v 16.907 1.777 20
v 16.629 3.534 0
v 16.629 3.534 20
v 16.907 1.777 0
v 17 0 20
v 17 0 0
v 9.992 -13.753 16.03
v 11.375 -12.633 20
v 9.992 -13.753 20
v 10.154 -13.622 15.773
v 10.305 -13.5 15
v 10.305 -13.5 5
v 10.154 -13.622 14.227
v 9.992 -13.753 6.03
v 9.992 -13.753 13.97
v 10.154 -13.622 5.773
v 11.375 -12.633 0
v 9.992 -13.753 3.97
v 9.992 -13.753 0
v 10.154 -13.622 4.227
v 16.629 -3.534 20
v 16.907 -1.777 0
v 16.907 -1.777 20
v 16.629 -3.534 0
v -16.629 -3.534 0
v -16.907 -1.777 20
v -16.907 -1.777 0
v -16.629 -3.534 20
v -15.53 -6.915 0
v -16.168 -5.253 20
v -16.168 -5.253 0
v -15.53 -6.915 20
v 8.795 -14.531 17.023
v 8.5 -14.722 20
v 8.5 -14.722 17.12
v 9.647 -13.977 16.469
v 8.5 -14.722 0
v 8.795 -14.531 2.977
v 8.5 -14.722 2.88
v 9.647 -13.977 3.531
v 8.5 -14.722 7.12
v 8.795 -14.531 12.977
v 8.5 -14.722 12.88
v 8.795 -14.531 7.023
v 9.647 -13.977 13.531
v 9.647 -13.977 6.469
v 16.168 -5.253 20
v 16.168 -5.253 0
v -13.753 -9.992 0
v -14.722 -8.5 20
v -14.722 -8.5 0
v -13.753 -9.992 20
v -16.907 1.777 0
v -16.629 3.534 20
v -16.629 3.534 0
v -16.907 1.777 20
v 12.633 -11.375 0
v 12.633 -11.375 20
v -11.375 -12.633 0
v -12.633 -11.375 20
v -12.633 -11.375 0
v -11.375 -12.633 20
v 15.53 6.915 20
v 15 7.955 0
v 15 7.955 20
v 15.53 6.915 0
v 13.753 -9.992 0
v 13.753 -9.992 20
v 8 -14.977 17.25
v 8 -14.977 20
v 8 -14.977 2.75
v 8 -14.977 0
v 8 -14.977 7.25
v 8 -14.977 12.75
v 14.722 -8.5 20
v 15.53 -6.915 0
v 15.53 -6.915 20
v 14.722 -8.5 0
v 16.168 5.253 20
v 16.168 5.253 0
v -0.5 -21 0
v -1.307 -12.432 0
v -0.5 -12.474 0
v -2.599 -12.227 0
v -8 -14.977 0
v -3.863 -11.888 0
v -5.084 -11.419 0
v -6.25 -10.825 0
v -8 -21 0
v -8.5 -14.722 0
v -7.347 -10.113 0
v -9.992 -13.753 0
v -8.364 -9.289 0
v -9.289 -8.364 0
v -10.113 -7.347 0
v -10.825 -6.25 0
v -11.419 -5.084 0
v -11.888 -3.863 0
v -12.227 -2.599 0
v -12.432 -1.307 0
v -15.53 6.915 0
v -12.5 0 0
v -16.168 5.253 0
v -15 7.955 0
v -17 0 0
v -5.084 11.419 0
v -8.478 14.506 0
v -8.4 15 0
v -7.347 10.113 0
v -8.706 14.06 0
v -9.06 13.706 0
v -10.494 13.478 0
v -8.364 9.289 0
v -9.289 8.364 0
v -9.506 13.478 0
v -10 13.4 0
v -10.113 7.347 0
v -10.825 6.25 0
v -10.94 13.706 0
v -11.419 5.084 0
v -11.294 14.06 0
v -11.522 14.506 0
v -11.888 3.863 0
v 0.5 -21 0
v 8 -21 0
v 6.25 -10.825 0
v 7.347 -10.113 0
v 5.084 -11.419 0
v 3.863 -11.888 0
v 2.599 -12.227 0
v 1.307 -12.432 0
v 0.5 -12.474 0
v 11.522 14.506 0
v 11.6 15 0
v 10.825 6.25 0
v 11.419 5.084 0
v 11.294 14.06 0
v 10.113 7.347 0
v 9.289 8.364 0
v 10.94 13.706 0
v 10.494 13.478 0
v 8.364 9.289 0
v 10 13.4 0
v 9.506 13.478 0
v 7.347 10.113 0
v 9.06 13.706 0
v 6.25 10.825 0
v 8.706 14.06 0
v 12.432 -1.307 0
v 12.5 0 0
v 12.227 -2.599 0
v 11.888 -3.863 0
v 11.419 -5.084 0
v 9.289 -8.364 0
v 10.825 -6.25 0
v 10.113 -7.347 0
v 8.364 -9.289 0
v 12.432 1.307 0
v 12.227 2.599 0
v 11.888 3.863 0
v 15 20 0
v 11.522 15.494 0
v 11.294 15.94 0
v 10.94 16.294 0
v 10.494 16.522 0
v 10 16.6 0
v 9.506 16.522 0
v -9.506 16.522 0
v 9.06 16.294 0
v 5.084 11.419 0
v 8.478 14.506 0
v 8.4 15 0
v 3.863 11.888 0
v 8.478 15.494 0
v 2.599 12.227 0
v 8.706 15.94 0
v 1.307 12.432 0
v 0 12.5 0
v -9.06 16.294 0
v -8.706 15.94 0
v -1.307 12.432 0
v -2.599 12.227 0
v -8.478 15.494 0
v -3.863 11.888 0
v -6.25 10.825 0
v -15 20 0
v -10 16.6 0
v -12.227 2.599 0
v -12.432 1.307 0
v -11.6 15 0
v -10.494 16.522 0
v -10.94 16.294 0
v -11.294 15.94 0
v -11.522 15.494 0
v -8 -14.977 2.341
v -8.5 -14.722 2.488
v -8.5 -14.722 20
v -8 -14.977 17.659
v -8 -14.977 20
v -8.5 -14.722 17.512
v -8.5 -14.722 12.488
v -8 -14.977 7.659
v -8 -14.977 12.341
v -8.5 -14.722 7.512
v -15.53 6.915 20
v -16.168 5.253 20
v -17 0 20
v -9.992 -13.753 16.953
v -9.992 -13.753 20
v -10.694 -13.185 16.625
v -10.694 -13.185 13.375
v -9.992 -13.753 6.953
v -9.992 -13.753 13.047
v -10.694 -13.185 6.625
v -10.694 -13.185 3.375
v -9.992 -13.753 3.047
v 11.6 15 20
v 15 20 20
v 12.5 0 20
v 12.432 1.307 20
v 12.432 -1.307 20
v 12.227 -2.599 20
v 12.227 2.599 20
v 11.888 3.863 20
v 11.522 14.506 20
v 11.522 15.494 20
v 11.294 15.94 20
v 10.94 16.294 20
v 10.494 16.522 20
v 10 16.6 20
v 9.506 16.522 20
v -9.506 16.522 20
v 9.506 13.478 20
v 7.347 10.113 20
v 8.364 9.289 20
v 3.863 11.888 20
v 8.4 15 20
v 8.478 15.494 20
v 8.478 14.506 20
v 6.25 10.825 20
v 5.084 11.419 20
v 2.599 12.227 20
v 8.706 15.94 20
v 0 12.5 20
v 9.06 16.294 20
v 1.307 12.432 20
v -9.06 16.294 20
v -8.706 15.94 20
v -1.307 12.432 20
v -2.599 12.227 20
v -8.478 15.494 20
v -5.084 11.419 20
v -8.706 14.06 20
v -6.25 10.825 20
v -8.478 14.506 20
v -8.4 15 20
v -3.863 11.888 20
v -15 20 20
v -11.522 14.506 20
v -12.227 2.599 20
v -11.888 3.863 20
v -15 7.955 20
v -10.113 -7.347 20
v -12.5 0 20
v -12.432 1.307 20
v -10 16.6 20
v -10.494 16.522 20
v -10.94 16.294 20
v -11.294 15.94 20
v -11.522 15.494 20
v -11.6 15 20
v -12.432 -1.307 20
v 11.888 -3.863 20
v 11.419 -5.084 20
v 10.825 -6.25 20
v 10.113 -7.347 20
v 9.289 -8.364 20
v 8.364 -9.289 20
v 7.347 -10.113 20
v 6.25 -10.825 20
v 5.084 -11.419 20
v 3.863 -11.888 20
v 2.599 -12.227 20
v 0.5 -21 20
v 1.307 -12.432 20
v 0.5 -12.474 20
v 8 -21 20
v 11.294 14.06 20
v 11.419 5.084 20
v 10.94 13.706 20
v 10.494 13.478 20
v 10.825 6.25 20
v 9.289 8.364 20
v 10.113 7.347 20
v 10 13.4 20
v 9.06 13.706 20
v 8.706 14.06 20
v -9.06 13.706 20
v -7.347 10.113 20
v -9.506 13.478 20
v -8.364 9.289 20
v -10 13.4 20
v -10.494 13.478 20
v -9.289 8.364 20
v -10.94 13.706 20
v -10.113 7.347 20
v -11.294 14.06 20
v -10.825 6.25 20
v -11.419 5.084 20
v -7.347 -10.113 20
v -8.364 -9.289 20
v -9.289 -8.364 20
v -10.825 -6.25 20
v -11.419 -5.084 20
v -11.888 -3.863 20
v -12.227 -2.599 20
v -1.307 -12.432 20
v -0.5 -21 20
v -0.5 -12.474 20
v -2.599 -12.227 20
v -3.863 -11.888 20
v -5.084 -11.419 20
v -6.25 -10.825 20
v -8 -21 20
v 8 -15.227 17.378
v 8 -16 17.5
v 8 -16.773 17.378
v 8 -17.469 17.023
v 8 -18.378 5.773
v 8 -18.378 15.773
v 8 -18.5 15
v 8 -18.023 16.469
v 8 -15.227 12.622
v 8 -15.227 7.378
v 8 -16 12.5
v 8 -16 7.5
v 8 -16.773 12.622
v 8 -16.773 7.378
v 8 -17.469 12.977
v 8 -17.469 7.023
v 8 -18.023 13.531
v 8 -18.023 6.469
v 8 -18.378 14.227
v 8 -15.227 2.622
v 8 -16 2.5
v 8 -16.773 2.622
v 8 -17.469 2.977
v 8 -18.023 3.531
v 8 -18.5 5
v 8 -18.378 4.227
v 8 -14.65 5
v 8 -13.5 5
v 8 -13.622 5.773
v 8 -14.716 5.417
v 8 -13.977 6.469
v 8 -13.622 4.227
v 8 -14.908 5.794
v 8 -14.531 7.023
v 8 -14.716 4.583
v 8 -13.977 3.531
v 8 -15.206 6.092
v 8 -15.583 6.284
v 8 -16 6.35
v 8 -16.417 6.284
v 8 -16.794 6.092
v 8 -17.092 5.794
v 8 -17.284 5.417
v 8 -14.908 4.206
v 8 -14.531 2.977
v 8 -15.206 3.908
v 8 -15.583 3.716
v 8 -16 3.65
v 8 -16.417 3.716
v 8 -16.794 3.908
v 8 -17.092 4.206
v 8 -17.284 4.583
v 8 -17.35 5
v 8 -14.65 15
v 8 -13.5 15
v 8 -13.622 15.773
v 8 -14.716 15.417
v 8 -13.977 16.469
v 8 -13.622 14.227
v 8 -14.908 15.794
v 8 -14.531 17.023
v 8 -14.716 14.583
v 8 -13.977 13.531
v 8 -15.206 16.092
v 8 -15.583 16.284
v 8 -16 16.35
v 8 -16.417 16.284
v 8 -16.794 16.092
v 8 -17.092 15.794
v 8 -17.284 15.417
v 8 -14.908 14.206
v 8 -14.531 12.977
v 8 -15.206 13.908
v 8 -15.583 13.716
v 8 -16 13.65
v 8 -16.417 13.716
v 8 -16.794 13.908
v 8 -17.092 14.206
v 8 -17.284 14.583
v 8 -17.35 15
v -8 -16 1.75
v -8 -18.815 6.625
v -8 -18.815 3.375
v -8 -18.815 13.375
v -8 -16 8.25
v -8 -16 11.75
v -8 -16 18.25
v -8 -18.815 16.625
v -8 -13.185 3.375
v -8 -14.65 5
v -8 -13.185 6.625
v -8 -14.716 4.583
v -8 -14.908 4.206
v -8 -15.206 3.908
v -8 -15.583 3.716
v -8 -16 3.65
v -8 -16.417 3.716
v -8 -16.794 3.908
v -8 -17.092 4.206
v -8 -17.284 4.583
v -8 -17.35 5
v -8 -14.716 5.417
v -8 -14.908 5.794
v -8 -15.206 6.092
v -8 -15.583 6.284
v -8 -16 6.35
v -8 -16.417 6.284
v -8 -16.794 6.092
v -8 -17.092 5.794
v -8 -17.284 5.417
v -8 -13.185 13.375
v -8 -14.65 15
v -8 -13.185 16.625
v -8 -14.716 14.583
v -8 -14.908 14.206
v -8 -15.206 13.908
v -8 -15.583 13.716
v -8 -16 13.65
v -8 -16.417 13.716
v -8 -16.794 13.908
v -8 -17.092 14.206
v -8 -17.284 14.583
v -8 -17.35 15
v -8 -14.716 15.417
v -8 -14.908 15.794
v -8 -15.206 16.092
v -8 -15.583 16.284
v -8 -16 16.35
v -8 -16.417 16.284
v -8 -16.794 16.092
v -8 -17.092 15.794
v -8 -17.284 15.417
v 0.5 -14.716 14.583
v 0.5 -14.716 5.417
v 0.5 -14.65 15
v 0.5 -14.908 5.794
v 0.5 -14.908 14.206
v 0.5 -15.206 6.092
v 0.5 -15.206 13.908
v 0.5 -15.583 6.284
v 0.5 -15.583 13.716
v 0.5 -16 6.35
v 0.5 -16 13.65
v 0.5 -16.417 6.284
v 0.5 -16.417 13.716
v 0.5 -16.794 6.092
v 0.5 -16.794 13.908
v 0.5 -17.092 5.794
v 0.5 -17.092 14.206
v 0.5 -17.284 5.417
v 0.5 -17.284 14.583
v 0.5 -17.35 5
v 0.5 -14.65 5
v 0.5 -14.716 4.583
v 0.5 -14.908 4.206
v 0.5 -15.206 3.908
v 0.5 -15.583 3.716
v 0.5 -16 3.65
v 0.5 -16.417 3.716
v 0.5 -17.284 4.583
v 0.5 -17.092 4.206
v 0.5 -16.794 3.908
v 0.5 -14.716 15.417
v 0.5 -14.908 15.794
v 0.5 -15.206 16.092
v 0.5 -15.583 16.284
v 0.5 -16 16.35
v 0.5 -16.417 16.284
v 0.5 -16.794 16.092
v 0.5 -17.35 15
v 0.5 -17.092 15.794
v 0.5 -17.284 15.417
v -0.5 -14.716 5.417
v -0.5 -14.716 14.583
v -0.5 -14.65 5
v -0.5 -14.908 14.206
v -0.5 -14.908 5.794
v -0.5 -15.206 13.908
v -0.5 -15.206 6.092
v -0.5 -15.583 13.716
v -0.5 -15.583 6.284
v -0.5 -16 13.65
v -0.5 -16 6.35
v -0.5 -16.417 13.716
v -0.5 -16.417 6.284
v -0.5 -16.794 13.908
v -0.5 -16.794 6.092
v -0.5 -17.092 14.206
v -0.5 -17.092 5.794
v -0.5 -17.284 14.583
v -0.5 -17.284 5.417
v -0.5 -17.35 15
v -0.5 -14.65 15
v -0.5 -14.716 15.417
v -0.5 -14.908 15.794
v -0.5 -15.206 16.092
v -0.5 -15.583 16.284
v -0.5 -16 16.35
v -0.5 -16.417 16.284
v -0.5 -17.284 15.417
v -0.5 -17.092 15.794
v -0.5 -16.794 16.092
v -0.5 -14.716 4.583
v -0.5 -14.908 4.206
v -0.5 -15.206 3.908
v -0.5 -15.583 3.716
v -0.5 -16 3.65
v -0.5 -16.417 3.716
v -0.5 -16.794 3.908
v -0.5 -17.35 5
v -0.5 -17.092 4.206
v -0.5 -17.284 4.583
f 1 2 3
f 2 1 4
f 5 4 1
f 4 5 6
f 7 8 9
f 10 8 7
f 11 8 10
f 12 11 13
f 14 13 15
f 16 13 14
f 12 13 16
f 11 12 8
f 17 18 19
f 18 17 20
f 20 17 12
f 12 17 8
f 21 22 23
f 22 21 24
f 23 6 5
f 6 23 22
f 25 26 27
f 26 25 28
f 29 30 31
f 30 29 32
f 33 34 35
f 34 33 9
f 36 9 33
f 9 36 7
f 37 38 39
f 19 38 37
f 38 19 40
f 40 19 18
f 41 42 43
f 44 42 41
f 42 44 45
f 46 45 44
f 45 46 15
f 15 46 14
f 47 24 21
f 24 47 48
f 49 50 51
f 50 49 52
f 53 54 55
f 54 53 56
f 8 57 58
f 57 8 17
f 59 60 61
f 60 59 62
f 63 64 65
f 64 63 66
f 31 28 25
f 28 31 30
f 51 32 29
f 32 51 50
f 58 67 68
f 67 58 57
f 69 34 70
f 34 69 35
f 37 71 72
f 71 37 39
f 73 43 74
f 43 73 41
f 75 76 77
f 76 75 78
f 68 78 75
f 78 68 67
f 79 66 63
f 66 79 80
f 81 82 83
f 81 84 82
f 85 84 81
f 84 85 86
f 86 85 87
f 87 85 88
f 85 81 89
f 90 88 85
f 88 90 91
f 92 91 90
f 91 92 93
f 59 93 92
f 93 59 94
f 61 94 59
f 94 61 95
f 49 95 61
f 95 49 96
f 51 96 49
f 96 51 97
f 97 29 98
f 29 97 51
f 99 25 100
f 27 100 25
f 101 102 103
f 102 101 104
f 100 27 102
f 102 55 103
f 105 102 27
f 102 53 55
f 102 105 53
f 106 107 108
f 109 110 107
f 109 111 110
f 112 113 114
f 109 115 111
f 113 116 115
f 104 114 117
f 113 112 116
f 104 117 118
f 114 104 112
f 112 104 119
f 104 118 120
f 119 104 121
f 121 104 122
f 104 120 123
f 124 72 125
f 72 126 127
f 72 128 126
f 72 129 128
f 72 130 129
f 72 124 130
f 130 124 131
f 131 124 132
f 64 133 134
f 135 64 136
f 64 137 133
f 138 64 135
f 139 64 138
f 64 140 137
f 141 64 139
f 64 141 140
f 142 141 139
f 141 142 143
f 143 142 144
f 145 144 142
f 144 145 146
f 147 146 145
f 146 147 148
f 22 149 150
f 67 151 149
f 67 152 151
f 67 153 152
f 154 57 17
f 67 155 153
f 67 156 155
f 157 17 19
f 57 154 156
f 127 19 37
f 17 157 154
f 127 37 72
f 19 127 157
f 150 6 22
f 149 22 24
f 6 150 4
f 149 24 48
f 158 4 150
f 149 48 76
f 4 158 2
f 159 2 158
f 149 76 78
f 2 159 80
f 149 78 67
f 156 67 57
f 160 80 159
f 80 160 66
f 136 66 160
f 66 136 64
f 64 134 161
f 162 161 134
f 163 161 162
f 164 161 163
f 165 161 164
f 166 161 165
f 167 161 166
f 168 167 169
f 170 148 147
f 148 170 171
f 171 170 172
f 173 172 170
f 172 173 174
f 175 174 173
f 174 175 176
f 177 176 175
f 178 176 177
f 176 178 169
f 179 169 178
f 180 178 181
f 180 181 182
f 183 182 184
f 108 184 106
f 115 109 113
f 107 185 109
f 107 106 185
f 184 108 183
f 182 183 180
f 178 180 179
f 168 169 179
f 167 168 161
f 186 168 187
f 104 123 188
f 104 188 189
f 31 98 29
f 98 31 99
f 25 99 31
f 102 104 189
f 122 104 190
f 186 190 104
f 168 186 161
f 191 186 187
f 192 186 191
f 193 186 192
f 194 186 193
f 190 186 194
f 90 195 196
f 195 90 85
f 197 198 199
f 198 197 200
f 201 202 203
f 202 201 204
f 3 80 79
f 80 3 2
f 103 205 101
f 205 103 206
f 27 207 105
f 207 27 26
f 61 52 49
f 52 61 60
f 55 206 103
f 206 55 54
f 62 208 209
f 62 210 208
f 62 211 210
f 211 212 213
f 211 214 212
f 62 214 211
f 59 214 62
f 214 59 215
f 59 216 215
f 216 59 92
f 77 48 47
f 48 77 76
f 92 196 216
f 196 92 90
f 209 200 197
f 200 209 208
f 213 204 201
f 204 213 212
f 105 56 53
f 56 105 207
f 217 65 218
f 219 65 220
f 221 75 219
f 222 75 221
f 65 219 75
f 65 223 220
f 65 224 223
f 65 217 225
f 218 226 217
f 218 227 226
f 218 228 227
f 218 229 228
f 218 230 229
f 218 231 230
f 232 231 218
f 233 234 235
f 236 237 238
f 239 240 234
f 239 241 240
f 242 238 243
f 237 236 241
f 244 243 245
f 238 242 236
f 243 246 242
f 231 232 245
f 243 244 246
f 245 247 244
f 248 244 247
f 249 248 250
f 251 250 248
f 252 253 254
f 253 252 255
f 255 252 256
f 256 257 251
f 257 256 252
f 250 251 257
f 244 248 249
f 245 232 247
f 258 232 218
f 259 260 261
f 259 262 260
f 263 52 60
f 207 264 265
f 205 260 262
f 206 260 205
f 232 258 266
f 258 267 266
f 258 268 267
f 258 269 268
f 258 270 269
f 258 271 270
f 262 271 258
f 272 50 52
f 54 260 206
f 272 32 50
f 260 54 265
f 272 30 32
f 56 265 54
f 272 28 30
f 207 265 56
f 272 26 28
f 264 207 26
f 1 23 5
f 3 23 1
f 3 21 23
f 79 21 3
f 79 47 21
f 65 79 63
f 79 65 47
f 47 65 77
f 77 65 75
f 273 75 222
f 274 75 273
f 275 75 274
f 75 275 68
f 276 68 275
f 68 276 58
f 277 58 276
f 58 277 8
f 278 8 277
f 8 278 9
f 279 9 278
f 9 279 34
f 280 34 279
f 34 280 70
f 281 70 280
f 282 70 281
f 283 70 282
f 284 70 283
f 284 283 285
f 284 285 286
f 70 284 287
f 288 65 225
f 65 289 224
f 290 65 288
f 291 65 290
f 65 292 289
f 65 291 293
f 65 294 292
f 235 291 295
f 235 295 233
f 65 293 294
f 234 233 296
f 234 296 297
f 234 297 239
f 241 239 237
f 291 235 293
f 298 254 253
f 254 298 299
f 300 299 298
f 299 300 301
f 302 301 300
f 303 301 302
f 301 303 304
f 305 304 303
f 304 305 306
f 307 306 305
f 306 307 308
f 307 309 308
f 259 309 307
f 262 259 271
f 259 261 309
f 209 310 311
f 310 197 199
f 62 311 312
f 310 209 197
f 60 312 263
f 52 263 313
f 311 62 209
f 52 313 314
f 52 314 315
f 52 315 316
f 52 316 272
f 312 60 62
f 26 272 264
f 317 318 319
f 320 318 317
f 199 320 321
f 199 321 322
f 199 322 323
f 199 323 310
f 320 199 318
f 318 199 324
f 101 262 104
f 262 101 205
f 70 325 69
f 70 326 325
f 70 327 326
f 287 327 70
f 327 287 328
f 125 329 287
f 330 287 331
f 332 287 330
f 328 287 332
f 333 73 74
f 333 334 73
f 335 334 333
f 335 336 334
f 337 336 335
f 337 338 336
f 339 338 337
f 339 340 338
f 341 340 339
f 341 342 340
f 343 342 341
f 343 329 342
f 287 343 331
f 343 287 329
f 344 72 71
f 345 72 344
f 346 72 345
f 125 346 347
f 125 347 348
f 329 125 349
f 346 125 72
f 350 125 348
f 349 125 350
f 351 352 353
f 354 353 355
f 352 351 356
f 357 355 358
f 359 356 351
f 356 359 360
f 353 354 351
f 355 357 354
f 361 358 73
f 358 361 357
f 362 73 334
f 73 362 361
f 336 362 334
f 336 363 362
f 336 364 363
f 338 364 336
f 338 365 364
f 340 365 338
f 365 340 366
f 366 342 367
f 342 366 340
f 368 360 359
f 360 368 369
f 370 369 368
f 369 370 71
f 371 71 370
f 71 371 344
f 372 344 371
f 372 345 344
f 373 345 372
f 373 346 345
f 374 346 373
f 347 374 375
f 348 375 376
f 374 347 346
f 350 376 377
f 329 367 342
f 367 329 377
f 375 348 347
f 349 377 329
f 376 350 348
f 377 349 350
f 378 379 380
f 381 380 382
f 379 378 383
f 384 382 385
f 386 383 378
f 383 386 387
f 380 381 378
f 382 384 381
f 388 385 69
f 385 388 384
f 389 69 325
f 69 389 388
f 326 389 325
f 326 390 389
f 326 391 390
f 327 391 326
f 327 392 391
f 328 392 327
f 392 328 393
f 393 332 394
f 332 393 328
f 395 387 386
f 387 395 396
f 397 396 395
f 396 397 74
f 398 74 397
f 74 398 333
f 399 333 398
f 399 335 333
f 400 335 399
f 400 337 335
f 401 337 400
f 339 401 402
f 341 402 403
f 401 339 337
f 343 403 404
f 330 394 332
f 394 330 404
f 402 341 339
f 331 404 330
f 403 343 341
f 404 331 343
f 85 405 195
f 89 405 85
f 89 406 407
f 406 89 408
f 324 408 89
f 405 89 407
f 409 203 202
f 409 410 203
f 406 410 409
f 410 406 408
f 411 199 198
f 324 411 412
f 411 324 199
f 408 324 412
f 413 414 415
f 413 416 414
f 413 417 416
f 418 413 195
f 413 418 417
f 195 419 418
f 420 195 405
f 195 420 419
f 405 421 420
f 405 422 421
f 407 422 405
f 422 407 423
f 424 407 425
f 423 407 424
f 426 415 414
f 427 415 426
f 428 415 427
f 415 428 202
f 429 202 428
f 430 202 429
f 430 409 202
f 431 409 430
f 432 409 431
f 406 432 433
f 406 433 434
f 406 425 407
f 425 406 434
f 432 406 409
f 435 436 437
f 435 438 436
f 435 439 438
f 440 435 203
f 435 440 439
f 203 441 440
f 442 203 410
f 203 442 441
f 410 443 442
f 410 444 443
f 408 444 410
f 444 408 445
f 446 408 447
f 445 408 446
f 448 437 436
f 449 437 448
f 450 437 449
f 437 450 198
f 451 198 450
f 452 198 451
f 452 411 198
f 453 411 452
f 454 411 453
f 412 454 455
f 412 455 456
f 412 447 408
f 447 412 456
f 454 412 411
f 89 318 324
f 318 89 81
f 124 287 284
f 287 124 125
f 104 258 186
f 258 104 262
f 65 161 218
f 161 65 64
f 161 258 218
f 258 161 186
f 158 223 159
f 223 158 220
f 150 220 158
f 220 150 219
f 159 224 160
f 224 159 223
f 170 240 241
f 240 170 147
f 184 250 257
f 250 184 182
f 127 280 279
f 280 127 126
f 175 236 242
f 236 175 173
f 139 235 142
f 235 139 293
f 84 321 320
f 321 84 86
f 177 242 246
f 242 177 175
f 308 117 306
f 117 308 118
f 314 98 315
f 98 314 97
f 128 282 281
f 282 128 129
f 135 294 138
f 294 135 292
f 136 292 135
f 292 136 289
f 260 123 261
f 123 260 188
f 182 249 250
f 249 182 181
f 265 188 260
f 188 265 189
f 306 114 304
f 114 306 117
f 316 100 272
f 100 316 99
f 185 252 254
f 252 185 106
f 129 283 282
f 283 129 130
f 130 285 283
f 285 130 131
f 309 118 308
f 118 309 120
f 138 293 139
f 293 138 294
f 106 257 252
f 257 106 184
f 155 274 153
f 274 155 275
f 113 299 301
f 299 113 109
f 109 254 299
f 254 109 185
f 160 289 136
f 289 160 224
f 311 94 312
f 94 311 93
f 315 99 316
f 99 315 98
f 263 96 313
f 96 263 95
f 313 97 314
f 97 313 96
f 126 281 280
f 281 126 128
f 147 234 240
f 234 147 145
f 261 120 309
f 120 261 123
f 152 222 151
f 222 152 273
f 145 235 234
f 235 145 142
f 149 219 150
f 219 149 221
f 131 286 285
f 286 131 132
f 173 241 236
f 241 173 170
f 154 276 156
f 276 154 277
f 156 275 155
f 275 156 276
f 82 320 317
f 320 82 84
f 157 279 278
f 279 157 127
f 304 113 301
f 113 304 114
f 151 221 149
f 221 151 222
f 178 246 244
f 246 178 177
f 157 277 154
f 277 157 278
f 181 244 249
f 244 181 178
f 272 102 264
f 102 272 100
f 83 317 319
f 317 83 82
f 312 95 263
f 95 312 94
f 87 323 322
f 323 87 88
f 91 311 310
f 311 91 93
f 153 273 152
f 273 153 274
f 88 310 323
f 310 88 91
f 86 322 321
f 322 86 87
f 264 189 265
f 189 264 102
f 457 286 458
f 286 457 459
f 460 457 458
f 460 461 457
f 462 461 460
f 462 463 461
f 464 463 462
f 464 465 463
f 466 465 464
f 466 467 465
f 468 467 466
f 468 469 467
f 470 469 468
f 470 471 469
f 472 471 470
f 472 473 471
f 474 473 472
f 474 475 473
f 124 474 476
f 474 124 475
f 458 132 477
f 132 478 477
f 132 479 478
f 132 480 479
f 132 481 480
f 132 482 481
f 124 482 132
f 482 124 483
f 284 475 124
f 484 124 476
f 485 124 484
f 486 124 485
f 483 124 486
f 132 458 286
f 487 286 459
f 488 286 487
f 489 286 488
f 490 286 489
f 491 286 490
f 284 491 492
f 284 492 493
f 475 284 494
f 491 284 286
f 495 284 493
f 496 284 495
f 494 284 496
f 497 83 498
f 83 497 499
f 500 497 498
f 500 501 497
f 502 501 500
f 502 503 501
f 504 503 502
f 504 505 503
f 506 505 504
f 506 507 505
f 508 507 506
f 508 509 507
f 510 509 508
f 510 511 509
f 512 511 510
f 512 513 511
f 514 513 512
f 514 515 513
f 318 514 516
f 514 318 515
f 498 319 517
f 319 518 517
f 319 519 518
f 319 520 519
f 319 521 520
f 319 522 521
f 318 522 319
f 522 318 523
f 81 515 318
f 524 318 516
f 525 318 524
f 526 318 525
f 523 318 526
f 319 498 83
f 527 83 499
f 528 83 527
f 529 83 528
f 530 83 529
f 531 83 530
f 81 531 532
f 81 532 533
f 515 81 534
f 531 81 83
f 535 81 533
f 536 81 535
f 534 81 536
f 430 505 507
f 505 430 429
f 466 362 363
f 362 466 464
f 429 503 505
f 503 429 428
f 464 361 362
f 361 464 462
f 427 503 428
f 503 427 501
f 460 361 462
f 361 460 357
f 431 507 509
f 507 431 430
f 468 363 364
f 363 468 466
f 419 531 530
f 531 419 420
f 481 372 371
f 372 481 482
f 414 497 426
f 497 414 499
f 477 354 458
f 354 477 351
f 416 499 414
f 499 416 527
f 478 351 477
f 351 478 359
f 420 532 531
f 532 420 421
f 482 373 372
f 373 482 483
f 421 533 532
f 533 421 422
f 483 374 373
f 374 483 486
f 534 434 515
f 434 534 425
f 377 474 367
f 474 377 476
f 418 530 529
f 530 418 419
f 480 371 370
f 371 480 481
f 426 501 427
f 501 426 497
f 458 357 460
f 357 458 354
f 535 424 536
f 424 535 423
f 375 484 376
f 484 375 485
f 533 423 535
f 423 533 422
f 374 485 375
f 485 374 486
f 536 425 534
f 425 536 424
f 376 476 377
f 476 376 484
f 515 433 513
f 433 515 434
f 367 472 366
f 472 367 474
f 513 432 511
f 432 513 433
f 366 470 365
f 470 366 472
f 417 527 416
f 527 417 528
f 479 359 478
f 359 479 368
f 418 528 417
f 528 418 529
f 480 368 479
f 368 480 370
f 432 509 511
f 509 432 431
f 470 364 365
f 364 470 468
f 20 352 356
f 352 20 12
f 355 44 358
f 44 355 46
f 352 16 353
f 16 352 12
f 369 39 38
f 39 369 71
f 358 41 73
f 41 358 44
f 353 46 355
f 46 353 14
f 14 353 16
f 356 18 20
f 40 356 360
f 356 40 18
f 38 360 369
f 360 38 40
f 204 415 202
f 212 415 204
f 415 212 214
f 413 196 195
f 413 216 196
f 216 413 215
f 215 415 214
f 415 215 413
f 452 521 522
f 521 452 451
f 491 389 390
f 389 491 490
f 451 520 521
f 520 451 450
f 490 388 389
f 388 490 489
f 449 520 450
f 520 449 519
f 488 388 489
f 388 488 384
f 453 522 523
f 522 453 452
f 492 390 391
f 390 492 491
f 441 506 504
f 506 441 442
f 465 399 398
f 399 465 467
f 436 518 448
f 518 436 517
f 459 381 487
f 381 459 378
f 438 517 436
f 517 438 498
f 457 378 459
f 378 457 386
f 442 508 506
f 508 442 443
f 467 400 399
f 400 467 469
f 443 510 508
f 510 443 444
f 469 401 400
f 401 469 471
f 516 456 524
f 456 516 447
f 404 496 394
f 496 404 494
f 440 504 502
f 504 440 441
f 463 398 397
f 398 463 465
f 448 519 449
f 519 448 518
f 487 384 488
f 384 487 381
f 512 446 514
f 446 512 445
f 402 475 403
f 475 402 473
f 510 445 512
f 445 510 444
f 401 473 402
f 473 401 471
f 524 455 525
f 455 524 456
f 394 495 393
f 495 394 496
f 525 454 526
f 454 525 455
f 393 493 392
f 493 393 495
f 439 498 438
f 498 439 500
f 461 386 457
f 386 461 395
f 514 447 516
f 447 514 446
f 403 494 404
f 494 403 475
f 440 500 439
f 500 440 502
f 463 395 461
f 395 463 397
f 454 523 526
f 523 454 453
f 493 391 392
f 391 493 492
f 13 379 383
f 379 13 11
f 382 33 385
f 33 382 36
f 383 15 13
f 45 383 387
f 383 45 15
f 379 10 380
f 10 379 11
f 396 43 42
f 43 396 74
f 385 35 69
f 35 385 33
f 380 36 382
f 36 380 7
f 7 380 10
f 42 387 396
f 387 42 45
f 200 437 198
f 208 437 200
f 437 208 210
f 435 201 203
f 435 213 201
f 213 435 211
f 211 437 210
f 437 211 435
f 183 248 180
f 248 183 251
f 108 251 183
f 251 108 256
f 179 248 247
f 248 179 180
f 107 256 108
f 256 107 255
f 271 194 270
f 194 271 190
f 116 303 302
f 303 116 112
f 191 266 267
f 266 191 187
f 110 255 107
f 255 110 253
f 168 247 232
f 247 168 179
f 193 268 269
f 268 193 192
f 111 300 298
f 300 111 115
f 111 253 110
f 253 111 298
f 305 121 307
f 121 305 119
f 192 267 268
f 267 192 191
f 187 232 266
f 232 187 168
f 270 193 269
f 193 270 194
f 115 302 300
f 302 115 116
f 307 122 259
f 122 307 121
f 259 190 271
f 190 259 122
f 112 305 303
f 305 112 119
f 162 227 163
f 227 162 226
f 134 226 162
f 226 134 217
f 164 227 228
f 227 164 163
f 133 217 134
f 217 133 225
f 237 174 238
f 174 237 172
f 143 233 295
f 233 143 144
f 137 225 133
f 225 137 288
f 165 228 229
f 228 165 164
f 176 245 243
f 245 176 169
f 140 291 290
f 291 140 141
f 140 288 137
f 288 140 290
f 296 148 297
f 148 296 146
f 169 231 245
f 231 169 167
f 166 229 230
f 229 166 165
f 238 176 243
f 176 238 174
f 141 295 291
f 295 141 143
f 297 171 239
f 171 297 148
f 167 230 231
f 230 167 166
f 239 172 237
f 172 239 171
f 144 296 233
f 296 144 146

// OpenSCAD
bracelet();

module bracelet(){
$fn=20;
difference(){
union(){
cylinder(d=34,h=20,$fn=60);
translate([-8,-21,0])cube(size=[16,8,20]);
rotate([0,0,90])translate([5,-15,0])
    cube([15,30,20]);
}
translate([0,0,-1]) cylinder(d=25,h=22,$fn=60);
translate([-.5,-25,-1])cube(size=[1,20,22]);

translate ([-15,-16,5])rotate([0,90,0])
cylinder(d=2.7,h=100);
translate ([8,-16,5])rotate([0,90,0])
cylinder(d=5,h=100);
translate ([-18,-16,5])rotate([0,90,0])
cylinder(d=6.5,h=10,$fn=6);

translate ([-15,-16,15])rotate([0,90,0])
cylinder(d=2.7,h=100);
translate ([8,-16,15])rotate([0,90,0])
cylinder(d=5,h=100);
translate ([-18,-16,15])rotate([0,90,0])
cylinder(d=6.5,h=10,$fn=6);

translate ([-10,15,0])cylinder(d=3.2,h=100,center=true);
translate ([10,15,0])cylinder(d=3.2,h=100,center=true);
}
}
